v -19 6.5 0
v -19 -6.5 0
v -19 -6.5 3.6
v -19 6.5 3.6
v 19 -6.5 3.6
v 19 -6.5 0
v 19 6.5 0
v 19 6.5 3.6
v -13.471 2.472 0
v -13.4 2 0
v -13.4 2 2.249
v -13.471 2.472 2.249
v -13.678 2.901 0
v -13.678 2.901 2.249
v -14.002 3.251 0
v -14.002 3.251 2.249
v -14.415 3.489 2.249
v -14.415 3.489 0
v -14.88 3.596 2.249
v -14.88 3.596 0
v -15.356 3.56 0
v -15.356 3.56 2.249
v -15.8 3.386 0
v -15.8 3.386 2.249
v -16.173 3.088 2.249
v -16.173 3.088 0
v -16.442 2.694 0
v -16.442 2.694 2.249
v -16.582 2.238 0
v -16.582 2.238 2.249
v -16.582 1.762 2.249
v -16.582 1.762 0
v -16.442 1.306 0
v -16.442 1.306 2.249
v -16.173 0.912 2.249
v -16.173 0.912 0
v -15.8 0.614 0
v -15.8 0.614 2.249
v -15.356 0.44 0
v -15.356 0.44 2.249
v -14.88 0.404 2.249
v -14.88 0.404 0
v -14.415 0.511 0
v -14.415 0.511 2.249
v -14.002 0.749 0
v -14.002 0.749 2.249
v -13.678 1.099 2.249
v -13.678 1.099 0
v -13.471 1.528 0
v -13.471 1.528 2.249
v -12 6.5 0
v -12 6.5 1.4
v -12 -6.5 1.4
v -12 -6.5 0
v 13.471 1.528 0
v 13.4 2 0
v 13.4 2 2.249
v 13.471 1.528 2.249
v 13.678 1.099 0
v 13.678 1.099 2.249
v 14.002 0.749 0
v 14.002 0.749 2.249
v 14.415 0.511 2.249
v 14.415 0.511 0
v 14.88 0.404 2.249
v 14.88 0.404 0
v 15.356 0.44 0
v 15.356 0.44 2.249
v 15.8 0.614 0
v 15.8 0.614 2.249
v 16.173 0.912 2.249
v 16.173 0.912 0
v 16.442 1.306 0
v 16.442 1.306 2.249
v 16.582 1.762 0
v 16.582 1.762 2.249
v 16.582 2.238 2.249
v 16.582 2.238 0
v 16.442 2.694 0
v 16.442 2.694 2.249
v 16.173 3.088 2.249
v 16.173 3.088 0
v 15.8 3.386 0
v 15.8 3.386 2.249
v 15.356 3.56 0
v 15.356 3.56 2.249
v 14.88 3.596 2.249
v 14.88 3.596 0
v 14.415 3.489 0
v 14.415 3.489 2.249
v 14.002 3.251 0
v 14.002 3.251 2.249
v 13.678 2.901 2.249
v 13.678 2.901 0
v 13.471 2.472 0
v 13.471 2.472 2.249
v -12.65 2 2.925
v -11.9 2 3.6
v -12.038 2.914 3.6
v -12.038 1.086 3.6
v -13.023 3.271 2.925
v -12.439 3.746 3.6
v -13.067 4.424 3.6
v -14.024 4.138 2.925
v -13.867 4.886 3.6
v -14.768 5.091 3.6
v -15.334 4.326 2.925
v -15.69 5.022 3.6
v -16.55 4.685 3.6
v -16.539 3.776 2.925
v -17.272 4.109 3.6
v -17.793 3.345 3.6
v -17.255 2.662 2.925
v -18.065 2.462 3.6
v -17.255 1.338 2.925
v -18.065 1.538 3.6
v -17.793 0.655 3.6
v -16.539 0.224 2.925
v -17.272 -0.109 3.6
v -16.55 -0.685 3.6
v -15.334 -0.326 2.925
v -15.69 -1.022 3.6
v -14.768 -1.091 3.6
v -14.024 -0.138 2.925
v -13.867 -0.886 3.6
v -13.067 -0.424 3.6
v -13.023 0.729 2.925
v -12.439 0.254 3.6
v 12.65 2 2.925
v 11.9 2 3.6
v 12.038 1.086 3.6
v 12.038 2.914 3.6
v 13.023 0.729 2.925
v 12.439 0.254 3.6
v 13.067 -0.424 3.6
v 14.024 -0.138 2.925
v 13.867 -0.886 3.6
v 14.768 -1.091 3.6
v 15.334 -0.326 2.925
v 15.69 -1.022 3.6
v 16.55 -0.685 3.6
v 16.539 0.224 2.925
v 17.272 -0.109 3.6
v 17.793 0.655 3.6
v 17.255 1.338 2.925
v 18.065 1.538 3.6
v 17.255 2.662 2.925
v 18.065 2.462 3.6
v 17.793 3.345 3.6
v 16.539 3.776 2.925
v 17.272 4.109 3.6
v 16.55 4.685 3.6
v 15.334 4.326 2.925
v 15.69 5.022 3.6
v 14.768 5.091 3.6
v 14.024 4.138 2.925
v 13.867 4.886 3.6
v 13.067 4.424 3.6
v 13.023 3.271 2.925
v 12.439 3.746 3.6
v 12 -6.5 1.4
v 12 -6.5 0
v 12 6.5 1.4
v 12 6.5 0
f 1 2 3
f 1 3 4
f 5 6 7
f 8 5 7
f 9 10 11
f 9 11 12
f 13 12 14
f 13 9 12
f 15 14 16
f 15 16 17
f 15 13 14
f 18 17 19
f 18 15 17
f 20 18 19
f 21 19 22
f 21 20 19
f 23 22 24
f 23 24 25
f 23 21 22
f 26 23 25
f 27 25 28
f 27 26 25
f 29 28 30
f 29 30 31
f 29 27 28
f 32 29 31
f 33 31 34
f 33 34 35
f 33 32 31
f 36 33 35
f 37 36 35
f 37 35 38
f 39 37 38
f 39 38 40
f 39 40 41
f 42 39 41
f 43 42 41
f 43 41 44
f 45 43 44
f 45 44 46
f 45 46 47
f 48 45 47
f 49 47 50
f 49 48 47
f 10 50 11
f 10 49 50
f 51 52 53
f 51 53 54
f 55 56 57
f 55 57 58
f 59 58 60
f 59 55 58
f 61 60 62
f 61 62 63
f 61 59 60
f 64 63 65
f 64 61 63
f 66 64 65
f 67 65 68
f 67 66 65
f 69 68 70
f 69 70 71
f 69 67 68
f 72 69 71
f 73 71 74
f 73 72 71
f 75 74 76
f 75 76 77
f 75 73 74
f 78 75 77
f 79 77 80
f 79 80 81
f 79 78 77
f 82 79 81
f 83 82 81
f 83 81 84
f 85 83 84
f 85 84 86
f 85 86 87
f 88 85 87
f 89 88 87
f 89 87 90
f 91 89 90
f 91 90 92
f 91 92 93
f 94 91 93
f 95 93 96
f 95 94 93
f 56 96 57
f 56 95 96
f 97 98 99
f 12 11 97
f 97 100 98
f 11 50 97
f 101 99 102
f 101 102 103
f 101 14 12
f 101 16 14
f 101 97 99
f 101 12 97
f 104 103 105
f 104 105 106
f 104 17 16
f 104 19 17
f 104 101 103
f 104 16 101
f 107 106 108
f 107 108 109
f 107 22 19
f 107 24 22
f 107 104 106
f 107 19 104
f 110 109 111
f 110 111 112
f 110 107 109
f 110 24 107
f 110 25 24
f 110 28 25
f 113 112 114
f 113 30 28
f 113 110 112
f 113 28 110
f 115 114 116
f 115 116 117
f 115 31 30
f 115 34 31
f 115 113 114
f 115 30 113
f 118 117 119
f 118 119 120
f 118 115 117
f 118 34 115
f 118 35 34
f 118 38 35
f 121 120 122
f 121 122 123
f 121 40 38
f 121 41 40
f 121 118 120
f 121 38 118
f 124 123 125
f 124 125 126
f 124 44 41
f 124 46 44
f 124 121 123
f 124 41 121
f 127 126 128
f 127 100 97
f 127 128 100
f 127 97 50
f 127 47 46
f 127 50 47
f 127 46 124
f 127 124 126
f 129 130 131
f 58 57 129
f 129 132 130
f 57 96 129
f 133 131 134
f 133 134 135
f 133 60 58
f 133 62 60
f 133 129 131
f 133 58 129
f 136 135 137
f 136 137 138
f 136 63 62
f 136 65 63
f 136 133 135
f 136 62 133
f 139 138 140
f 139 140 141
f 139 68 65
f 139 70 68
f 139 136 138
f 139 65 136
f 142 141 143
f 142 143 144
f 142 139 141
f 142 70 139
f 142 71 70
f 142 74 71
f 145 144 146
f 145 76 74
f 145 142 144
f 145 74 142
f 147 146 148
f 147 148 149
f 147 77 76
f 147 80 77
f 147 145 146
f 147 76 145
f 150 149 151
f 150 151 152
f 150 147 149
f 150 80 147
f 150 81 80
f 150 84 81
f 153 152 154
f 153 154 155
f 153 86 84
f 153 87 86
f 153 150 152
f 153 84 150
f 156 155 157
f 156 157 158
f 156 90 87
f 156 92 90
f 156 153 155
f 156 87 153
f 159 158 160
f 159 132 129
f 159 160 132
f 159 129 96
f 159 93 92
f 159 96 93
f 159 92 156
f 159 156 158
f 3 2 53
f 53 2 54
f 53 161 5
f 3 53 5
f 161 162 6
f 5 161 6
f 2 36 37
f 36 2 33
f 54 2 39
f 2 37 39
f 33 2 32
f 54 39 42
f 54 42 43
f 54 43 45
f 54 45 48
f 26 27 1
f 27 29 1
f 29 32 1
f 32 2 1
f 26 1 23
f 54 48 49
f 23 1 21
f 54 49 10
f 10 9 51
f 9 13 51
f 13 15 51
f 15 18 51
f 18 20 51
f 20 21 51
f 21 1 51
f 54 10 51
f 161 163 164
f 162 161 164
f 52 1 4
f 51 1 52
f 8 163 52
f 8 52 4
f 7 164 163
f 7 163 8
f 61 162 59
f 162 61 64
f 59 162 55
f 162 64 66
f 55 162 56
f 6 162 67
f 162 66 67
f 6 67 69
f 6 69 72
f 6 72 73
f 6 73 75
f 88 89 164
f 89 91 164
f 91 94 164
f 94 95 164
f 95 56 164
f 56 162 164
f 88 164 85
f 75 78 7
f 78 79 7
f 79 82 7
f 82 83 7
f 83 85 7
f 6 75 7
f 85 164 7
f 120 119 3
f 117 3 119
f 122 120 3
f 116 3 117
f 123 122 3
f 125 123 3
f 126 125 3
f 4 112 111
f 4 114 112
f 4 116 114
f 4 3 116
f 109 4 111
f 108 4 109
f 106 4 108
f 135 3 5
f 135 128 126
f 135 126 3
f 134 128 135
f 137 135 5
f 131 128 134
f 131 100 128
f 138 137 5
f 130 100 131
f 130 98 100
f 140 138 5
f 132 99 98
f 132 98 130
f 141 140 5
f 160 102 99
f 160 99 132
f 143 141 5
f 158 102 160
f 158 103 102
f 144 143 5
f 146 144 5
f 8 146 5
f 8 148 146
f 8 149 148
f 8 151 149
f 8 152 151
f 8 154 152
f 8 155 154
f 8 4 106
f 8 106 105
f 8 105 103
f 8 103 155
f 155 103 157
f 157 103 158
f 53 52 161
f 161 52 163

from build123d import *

# Parameters (mm, degrees)
SKETCH1_W           = 38
SKETCH1_H           = 13
SKETCH1_R           = 1.6
BOSS_EXTRUDE1_DEPTH = 3.6
SKETCH2_W           = 24
SKETCH2_H           = 1.4
CUT_EXTRUDE1_DEPTH  = 24.301502098
CHAMFER1_SIZE       = 1.5
CHAMFER1_SIZE2      = 1.350606066


with BuildPart() as part:
    # Sketch1 → Boss-Extrude1 (new body)
    with BuildSketch(Plane.XY):
        Rectangle(SKETCH1_W, SKETCH1_H)
        with Locations((-15, 2)):
            Circle(SKETCH1_R, mode=Mode.SUBTRACT)
        with Locations(Location((15, 2, 0), (0, 0, 180))):
            Circle(SKETCH1_R, mode=Mode.SUBTRACT)
    extrude(amount=BOSS_EXTRUDE1_DEPTH)

    # Sketch2 → Cut-Extrude1 (cut, through all)
    with BuildSketch(Plane(origin=(0, 6.5, 0), x_dir=(1, 0, 0), z_dir=(0, 1, 0))):
        with Locations((0, -0.7)):
            Rectangle(SKETCH2_W, SKETCH2_H)
    extrude(amount=-CUT_EXTRUDE1_DEPTH, mode=Mode.SUBTRACT)

    # Chamfer1
    chamfer1_edges = [part.edges().sort_by_distance(p)[0] for p in [
        (-16.6, 2, 3.6),
        (16.6, 2, 3.6),
    ]]
    chamfer1_side = [part.faces().sort_by_distance(p)[0] for p in [
        (0, -0.067313028, 3.6),
    ]]
    chamfer(chamfer1_edges, length=CHAMFER1_SIZE, length2=CHAMFER1_SIZE2, reference=chamfer1_side[0])


solid = part.part
